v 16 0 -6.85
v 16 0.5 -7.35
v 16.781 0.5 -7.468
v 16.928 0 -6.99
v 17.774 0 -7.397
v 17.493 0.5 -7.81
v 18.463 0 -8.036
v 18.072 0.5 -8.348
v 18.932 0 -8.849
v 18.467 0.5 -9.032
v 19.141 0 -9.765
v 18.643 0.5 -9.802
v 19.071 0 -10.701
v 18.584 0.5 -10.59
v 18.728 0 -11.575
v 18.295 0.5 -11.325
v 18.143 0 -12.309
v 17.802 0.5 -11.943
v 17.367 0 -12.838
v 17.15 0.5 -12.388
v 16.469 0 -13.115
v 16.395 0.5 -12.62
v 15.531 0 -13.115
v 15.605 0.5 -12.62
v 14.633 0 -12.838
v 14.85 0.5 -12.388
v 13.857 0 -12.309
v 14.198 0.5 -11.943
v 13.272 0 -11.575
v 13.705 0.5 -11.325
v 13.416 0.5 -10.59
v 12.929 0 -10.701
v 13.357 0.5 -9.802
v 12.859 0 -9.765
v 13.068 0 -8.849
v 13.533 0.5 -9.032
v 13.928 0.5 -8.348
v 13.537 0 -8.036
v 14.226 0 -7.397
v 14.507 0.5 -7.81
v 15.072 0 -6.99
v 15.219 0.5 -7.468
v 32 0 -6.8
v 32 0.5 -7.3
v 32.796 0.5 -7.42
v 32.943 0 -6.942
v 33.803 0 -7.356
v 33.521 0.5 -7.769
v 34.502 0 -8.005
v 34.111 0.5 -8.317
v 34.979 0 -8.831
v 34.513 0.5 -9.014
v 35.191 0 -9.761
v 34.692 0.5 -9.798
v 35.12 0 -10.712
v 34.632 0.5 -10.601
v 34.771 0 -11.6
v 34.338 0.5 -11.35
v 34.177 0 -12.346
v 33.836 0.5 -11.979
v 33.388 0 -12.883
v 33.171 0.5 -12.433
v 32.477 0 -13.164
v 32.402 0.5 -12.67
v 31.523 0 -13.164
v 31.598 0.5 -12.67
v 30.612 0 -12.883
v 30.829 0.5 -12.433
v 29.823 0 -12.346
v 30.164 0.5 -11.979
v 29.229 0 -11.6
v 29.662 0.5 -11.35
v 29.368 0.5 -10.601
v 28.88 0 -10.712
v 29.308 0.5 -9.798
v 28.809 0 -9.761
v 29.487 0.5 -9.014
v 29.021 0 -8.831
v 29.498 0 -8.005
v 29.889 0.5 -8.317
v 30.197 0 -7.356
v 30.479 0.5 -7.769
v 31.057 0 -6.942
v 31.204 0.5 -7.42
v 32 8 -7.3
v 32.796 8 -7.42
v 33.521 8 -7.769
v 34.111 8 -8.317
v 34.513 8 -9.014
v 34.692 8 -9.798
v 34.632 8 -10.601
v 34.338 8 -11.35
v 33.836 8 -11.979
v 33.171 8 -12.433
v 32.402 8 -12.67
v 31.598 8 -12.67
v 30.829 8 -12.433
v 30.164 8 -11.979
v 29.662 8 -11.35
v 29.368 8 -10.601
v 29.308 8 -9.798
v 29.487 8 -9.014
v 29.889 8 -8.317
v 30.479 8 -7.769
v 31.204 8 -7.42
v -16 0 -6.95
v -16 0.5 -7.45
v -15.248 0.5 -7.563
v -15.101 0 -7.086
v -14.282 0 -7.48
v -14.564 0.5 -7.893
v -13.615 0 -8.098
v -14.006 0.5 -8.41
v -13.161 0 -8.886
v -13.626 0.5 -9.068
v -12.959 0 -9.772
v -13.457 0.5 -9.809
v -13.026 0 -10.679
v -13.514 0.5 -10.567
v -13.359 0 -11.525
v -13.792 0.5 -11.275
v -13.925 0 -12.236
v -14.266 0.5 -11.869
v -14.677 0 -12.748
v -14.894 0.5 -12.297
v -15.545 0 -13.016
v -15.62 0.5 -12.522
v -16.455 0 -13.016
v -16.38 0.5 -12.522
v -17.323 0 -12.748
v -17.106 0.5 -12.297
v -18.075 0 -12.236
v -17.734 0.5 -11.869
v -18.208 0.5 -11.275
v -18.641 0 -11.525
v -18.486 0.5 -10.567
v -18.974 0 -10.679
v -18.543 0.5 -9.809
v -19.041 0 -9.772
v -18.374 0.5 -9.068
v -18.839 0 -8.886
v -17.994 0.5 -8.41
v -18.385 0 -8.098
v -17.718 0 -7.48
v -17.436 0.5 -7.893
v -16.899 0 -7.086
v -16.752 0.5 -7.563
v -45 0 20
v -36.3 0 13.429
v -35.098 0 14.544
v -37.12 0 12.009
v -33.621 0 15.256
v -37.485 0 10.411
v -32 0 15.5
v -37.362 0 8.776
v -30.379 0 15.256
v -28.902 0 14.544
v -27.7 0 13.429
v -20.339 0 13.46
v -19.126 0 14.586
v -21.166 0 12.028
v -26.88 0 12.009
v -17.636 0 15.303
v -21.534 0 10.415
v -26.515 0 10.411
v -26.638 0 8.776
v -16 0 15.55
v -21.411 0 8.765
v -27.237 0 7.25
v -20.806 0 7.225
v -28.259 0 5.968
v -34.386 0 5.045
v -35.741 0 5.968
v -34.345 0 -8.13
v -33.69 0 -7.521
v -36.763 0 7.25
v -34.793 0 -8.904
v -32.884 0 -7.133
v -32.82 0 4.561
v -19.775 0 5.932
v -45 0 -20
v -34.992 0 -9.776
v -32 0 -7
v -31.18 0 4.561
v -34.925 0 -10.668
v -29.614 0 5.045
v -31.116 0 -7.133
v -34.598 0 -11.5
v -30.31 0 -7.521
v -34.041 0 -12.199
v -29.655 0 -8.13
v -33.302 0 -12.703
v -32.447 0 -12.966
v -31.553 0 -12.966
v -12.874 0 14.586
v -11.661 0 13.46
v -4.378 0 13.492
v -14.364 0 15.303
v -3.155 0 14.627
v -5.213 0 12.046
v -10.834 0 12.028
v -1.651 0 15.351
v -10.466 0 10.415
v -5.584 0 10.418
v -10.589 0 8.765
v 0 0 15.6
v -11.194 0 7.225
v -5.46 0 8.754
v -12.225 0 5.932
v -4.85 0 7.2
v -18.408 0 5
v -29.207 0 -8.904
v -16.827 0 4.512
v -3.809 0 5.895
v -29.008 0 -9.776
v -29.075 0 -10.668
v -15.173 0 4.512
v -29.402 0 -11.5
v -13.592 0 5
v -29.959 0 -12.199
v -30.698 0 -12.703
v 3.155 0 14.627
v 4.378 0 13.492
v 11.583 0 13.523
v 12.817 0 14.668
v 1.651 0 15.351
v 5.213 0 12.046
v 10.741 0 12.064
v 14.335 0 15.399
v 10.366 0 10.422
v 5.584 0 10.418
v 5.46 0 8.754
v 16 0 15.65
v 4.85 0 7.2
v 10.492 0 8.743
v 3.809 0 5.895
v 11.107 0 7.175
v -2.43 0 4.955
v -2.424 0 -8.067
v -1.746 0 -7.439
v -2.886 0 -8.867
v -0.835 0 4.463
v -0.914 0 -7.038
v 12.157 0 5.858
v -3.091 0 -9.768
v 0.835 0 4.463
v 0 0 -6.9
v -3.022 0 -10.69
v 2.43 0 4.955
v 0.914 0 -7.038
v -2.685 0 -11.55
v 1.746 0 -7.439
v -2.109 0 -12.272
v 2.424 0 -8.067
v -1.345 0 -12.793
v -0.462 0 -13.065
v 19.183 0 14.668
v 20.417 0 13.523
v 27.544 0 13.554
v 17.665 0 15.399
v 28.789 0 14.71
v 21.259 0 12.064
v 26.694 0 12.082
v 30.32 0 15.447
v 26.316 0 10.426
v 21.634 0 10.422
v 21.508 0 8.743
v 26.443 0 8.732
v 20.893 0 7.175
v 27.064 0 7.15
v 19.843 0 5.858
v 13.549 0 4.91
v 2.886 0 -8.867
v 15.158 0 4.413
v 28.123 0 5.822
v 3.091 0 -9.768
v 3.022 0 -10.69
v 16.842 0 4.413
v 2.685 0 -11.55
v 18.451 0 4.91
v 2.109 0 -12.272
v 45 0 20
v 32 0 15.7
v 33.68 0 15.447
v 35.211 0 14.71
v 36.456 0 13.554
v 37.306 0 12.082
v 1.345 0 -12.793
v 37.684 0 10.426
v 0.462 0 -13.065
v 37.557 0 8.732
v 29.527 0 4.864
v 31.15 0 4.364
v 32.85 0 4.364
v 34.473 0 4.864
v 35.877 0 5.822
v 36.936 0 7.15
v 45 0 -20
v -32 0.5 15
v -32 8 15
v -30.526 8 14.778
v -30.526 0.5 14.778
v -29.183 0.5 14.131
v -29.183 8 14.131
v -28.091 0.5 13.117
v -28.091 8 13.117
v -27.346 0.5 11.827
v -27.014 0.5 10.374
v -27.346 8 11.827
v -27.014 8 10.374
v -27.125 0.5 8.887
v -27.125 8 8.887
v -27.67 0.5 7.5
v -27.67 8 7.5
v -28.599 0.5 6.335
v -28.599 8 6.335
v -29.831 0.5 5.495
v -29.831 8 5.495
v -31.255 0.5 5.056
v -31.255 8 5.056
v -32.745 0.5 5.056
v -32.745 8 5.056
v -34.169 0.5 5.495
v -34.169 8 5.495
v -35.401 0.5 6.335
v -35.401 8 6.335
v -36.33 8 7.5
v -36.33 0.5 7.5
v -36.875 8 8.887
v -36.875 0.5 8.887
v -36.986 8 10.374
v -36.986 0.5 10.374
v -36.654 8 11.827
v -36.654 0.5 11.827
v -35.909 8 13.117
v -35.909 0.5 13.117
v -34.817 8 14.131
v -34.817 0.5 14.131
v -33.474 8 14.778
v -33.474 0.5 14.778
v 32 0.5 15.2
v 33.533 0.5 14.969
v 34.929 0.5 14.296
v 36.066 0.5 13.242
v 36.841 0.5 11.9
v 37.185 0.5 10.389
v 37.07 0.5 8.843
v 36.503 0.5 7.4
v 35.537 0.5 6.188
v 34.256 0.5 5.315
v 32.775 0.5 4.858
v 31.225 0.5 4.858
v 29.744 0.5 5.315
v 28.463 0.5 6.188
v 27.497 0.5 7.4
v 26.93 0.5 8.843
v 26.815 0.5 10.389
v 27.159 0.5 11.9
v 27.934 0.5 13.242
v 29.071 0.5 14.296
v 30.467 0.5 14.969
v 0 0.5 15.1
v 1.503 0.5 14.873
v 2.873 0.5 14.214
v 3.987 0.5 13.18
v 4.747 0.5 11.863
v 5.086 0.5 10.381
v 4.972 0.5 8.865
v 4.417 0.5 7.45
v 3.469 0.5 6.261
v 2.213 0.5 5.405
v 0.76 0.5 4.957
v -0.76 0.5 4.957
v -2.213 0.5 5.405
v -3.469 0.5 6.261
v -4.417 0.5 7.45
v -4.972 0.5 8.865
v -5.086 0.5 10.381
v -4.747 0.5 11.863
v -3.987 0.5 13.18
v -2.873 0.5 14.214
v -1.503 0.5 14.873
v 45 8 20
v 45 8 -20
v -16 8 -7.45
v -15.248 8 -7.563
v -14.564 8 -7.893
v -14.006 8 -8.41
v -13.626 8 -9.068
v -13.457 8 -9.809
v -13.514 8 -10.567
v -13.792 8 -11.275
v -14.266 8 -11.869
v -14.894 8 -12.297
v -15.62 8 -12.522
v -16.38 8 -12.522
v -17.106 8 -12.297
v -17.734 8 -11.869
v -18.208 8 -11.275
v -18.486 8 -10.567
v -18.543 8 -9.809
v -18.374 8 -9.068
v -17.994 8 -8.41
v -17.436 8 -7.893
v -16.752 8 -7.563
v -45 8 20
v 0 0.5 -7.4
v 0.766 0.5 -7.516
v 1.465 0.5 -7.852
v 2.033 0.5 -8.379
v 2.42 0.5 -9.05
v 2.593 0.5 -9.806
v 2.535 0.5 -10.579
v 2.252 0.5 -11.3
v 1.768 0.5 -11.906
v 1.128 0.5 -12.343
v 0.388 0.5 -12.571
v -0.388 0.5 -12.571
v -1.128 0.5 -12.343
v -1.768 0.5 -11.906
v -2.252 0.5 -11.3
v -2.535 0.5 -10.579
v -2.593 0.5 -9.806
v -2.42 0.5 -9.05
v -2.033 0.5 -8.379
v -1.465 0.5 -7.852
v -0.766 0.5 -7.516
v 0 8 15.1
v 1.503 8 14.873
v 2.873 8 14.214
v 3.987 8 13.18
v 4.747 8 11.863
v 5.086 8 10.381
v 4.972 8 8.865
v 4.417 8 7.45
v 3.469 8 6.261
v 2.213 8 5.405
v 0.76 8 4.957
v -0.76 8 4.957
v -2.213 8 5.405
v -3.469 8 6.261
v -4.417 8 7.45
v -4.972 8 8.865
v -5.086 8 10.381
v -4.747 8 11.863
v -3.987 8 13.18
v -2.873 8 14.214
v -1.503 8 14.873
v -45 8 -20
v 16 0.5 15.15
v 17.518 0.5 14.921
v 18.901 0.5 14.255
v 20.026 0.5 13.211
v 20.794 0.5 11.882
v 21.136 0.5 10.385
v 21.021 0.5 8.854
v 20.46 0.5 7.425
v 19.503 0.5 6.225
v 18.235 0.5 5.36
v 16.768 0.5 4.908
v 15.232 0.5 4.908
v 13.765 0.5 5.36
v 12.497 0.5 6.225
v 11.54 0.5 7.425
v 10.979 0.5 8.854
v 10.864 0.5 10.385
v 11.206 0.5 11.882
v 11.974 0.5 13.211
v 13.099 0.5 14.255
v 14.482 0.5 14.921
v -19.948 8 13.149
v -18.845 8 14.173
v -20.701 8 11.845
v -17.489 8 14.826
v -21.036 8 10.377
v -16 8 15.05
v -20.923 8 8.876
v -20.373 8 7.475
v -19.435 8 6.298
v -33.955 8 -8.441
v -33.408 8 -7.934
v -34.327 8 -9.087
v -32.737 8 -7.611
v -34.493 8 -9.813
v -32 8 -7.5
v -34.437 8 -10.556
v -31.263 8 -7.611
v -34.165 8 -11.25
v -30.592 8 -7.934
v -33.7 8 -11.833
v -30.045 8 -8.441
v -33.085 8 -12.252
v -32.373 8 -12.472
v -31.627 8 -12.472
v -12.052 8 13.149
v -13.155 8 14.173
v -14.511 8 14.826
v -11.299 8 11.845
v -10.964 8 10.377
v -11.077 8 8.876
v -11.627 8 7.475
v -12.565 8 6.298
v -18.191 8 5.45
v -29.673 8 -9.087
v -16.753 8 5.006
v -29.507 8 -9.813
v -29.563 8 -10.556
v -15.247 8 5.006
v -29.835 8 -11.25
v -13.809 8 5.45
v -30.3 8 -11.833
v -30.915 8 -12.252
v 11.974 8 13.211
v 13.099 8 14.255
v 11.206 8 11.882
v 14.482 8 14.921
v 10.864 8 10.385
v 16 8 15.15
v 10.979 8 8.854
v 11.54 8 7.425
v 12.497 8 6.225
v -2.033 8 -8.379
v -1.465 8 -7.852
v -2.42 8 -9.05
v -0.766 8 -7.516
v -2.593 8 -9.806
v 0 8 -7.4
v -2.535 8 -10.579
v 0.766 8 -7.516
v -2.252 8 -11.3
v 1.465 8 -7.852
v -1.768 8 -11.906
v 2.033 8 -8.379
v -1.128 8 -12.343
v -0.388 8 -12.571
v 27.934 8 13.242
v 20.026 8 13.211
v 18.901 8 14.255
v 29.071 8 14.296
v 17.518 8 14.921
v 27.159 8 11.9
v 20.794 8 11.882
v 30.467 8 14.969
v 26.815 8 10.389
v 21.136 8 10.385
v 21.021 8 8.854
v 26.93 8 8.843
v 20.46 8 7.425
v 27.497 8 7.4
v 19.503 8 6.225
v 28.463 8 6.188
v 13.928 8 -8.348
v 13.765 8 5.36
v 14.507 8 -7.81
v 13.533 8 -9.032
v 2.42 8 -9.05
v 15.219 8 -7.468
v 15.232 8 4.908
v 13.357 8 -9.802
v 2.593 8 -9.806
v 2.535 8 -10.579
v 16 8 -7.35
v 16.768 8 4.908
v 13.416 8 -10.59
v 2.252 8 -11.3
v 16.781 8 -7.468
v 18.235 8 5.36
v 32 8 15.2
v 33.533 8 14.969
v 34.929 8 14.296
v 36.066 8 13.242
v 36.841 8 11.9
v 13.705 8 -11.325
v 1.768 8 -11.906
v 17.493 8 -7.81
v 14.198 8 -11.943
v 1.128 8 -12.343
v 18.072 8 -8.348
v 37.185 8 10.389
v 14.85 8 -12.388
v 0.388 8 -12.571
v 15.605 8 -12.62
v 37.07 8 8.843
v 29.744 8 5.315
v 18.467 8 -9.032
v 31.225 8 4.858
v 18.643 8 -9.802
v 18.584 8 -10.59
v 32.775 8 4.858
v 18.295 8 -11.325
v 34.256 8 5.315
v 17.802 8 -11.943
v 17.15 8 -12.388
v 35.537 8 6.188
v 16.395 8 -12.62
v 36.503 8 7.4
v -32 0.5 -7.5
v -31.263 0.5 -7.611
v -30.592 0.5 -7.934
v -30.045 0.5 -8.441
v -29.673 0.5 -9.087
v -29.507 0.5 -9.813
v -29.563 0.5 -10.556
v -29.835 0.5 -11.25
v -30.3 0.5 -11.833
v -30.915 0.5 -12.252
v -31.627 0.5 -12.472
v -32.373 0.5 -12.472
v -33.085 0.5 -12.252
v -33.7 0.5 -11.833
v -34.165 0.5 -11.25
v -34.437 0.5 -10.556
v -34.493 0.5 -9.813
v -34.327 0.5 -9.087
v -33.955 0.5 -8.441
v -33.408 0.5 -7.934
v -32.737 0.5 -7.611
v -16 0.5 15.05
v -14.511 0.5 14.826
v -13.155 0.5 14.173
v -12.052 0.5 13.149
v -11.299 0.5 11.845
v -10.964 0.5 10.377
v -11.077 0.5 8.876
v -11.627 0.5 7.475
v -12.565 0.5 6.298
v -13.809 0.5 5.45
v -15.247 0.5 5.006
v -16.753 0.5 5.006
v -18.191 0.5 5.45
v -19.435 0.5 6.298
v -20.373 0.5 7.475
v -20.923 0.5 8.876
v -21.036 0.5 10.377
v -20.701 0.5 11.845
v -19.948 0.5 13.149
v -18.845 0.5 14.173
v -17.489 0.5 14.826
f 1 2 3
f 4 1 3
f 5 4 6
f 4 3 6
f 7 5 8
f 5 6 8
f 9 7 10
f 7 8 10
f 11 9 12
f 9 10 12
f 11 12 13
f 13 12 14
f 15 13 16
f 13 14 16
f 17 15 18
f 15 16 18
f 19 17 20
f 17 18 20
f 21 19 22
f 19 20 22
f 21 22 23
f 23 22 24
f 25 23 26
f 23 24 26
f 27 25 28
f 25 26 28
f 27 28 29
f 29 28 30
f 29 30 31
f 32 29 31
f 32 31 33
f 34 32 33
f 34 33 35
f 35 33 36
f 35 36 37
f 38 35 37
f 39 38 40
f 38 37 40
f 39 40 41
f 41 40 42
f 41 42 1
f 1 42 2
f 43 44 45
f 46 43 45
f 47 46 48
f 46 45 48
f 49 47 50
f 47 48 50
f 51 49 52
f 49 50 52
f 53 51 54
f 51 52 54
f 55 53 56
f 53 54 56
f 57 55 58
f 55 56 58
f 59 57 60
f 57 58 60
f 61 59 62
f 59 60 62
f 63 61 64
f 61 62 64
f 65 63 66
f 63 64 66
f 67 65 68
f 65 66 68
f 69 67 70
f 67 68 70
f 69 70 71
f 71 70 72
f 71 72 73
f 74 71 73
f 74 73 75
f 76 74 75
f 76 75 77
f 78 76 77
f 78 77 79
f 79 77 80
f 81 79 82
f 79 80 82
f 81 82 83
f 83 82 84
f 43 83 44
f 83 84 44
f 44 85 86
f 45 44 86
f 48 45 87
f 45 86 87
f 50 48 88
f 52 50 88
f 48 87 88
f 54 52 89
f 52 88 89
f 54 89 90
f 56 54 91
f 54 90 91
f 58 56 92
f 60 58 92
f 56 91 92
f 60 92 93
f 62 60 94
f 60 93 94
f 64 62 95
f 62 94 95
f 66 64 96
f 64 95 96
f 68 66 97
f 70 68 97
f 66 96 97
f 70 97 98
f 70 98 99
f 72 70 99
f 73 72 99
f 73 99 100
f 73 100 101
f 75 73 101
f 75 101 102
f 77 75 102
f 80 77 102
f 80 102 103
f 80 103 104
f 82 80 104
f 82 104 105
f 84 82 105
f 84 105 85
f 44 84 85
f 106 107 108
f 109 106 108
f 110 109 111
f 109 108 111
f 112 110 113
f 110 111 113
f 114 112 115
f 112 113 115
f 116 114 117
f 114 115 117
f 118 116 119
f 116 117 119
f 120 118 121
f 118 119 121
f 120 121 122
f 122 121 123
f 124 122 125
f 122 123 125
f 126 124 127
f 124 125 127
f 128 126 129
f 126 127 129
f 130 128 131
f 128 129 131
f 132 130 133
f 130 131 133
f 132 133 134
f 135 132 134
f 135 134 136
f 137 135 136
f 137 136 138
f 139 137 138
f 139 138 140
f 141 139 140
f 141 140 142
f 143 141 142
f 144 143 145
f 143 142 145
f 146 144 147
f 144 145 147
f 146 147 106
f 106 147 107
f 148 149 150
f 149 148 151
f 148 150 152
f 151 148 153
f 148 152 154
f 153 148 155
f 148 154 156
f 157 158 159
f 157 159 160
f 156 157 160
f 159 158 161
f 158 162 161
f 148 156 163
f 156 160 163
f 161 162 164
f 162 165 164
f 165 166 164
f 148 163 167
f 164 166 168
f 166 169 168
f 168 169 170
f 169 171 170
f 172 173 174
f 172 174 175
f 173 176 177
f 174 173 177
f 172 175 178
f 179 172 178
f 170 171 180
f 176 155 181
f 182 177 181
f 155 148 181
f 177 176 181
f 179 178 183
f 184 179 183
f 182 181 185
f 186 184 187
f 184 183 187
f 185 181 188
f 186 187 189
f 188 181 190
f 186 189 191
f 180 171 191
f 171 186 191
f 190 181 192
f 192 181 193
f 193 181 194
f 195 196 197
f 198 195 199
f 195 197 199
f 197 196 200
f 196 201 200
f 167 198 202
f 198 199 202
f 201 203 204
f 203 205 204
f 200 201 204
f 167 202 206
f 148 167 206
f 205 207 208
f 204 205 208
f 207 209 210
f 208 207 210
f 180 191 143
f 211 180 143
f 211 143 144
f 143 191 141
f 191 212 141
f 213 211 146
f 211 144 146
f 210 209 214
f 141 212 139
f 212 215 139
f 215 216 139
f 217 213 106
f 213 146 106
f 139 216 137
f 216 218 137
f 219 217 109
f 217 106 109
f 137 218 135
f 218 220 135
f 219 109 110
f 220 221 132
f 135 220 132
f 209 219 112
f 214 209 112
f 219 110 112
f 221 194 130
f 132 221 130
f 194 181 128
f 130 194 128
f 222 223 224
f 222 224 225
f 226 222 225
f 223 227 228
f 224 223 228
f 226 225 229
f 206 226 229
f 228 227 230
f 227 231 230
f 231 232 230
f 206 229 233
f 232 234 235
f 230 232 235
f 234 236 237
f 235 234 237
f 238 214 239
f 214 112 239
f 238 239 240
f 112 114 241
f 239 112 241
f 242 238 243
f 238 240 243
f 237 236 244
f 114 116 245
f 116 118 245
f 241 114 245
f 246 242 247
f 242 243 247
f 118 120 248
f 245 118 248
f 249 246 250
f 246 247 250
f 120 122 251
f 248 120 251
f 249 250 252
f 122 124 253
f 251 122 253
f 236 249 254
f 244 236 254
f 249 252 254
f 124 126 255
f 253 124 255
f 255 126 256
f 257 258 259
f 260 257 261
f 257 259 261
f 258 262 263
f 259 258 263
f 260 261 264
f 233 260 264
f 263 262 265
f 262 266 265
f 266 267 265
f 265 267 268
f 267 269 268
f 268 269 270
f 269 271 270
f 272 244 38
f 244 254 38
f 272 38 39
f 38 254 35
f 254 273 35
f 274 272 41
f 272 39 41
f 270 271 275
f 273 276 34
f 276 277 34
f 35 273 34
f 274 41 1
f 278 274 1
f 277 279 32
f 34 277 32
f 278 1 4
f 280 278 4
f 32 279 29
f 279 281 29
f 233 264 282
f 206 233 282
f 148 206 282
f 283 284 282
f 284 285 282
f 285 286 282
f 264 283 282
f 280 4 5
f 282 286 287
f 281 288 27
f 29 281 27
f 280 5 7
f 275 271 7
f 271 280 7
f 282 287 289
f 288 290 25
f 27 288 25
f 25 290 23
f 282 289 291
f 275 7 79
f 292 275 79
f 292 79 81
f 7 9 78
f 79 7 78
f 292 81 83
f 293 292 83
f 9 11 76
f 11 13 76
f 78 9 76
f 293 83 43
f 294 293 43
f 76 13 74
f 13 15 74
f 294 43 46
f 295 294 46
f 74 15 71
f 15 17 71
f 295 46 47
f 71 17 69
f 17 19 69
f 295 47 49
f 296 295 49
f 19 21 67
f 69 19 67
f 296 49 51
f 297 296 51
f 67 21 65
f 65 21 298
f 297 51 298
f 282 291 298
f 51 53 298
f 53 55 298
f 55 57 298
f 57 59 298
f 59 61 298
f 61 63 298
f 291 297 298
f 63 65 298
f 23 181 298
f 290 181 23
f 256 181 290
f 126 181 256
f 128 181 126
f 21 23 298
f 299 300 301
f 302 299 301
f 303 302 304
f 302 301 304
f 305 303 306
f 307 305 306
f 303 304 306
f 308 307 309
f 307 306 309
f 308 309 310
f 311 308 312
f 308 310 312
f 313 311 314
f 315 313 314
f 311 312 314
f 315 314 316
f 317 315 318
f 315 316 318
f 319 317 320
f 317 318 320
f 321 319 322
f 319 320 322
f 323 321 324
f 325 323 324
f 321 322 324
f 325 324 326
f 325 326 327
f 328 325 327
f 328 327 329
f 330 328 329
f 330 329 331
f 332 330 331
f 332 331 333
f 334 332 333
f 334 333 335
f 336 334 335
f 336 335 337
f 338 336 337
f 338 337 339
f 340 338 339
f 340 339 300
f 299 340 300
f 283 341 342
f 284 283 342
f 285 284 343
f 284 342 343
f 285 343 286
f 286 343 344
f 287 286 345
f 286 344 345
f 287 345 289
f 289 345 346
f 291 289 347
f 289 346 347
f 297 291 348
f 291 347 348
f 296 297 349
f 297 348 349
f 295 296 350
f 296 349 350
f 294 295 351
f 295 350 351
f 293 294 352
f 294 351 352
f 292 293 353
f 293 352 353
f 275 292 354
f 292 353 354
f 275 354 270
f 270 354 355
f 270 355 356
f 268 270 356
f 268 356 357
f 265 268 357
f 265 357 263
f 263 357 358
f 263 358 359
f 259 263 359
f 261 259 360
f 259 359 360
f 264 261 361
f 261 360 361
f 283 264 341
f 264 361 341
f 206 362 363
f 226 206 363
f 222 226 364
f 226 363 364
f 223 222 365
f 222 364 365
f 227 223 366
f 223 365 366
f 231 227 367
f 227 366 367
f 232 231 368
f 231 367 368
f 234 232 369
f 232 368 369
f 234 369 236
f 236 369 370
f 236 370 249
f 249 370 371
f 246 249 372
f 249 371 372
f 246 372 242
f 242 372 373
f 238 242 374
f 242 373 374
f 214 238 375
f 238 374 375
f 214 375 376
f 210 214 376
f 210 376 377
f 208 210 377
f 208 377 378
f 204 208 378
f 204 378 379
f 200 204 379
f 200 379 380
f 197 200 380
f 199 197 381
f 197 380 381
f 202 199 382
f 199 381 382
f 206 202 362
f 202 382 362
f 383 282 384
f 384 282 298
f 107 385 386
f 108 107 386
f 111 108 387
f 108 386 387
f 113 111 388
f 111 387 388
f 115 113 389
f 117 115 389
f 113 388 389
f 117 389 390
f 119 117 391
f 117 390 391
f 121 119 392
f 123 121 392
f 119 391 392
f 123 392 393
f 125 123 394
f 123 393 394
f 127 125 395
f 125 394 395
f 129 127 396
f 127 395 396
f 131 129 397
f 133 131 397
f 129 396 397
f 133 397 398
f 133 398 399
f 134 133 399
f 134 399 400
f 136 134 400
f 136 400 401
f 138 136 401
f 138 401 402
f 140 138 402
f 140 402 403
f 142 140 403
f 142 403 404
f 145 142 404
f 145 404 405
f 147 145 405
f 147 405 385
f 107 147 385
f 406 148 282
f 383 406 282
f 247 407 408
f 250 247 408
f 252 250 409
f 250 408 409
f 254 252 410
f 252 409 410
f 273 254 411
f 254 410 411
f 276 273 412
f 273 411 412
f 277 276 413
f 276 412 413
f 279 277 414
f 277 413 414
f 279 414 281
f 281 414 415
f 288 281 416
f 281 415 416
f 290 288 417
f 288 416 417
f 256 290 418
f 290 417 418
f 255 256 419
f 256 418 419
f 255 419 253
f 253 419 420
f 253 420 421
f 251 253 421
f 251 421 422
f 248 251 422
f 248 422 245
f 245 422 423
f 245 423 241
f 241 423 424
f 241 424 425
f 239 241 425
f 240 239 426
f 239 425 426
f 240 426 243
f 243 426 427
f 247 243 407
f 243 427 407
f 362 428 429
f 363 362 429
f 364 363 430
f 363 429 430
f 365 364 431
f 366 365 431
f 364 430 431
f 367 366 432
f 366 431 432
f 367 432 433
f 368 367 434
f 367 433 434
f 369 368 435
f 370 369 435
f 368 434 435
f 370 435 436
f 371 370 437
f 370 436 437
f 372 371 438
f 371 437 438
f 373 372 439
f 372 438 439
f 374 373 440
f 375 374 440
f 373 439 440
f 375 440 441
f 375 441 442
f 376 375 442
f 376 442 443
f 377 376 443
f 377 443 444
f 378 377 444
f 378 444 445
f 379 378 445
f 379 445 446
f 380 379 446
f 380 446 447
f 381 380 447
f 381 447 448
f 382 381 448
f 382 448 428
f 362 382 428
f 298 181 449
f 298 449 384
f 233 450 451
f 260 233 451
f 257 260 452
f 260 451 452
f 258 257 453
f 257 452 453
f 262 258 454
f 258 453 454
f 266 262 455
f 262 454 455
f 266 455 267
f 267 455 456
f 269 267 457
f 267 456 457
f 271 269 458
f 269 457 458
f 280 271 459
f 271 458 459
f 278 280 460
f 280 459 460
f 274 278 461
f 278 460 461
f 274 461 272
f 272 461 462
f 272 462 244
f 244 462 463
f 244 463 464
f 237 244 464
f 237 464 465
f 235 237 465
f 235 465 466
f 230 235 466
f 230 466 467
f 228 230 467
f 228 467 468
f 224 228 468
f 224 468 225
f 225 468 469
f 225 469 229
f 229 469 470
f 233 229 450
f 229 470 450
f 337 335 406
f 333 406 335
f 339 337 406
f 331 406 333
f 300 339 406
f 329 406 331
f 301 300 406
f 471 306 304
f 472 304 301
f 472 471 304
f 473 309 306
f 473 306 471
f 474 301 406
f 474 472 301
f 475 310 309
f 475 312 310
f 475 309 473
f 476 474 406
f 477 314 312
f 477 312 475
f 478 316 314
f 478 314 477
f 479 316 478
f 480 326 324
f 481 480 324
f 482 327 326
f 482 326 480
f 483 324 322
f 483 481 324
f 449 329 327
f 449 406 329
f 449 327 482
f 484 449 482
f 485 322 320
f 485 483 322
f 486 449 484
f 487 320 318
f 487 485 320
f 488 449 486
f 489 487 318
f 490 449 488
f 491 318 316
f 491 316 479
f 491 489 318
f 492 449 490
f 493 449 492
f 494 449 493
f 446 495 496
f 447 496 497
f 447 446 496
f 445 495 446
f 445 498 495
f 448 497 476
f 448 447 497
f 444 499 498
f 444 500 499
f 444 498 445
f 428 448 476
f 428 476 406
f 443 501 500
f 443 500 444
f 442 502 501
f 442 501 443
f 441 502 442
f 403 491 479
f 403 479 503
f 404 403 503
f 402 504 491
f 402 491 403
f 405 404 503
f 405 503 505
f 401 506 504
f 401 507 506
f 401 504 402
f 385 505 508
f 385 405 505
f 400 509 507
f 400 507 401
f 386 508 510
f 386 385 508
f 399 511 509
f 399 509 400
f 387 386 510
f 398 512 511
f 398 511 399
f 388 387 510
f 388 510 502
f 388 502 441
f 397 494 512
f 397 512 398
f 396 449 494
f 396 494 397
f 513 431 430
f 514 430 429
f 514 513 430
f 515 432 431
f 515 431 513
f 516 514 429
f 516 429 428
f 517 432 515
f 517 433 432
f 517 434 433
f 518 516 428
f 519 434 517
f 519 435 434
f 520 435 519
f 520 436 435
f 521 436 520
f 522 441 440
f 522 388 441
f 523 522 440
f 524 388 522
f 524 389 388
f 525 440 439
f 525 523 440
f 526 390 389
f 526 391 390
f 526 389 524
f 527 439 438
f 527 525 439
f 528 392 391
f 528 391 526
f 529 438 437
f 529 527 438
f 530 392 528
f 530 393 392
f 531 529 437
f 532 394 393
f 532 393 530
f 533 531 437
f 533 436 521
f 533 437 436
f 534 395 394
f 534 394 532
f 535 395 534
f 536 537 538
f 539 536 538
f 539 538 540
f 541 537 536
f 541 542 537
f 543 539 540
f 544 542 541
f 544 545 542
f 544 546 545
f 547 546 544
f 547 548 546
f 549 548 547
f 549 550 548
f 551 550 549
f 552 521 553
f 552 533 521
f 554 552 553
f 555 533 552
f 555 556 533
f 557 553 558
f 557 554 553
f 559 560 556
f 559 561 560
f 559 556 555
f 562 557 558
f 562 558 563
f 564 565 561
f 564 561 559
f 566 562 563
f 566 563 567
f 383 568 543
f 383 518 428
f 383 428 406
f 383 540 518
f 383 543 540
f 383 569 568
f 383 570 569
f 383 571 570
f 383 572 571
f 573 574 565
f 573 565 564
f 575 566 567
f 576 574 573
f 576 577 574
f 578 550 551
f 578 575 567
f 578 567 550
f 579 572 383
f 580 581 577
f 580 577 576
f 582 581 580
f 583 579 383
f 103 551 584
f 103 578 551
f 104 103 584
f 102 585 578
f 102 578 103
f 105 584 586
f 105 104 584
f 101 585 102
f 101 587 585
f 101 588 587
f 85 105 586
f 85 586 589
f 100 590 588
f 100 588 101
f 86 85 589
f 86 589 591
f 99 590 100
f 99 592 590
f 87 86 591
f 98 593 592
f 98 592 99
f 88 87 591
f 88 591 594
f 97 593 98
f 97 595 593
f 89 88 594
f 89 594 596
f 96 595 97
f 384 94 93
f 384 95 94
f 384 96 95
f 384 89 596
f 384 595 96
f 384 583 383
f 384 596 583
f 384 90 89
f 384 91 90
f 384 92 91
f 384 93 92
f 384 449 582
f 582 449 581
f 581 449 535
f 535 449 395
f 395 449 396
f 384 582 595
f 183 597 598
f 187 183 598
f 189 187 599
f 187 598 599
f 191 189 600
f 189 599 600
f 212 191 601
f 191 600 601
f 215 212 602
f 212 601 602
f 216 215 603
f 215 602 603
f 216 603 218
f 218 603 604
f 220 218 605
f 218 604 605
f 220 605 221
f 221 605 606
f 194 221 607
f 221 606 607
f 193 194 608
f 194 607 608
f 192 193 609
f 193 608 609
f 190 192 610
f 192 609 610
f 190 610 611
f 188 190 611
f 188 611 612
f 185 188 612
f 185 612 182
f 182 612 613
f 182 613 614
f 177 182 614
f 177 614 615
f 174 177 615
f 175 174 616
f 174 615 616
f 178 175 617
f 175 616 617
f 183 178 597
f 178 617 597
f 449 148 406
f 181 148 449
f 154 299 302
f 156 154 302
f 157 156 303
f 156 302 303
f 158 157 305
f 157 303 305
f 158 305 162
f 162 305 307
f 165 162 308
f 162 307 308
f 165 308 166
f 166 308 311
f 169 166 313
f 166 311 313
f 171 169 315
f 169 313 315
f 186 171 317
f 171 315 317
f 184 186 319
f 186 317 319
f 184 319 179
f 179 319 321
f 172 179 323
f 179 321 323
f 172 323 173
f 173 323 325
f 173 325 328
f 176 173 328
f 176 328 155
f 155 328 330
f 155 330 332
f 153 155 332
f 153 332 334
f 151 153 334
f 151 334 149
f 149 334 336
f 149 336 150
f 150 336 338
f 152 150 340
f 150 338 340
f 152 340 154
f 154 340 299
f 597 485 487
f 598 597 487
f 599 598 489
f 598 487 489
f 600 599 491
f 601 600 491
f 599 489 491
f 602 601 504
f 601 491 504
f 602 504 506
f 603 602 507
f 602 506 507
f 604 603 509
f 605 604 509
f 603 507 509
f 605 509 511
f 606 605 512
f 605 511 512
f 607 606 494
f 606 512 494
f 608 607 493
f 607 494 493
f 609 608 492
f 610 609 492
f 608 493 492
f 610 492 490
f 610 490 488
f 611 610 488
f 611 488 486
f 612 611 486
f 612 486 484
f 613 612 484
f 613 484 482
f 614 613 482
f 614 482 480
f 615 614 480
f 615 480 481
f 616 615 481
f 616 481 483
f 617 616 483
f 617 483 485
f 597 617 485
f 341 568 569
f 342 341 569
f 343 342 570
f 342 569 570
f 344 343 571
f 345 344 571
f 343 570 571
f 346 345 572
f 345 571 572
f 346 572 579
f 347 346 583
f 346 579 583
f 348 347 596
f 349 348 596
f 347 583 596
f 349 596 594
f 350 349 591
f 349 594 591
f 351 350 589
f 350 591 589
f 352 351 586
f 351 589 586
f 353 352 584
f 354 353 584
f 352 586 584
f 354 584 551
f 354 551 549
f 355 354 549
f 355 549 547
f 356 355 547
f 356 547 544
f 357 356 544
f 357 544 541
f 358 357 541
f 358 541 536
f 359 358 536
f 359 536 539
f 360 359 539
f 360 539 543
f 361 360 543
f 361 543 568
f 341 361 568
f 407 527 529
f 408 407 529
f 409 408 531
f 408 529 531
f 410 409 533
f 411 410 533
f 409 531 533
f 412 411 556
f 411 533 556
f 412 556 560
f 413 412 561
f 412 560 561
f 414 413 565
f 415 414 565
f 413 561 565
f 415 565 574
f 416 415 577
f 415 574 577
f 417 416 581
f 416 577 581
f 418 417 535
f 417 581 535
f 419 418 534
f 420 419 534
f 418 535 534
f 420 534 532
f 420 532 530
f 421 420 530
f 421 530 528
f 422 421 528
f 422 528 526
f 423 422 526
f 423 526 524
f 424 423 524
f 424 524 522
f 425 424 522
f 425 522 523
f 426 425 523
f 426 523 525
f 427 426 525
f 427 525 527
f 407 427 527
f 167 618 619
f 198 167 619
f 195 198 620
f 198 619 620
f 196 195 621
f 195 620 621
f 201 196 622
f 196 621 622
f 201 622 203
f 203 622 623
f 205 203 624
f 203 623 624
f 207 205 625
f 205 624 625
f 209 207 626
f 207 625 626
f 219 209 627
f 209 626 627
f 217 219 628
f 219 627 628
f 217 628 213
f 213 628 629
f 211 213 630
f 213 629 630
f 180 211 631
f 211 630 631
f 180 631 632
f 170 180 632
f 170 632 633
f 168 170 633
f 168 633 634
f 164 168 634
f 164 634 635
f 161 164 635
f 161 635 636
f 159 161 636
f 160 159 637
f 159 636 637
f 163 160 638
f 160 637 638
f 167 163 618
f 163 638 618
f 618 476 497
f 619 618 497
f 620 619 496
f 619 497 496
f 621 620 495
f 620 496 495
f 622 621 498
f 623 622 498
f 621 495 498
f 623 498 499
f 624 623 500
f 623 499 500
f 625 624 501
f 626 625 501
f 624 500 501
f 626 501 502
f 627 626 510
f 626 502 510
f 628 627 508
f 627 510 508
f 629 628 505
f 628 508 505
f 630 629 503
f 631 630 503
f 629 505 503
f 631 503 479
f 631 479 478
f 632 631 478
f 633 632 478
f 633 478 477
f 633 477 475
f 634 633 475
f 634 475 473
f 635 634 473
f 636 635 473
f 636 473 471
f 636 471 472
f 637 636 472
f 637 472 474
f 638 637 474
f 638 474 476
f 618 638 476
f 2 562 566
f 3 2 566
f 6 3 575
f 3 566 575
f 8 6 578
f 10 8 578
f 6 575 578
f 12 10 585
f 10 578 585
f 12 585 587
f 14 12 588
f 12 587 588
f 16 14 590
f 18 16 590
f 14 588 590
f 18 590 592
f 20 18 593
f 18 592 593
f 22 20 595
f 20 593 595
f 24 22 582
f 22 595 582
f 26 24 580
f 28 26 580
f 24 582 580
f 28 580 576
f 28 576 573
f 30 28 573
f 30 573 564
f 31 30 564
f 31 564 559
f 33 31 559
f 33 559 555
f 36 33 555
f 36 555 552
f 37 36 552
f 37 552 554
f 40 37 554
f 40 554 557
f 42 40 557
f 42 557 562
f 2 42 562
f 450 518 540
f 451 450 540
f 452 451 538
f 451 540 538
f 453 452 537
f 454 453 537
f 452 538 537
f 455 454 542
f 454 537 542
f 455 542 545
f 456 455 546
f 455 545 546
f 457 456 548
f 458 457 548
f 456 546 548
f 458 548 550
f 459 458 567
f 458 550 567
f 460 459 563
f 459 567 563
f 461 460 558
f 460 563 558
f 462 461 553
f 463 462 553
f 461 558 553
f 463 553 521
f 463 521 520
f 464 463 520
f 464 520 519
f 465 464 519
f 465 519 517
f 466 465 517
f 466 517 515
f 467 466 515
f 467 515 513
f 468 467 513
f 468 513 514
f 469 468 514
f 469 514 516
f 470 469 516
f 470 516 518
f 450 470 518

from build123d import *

# Parameters (mm, degrees)
SKETCH1_W         = 90
SKETCH1_H         = 40
PLATE_DEPTH       = 8
SKETCH2_R         = 2.5
SKETCH2_R_2       = 2.55
SKETCH2_R_3       = 2.6
SKETCH2_R_4       = 2.65
SKETCH2_R_5       = 2.7
SKETCH2_R_6       = 5
SKETCH2_R_7       = 5.05
SKETCH2_R_8       = 5.1
SKETCH2_R_9       = 5.15
SKETCH2_R_10      = 5.2
TEST_HOLES_DEPTH  = 50.889878733
BED_CHAMFERS_SIZE = 0.5


with BuildPart() as part:
    # Sketch1 → Plate (new body)
    with BuildSketch(Plane(origin=(0, 0, 0), x_dir=(1, 0, 0), z_dir=(0, 1, 0))):
        Rectangle(SKETCH1_W, SKETCH1_H)
    extrude(amount=PLATE_DEPTH)

    # Sketch2 → Test holes (cut, through all)
    with BuildSketch(Plane(origin=(0, 8, 0), x_dir=(1, 0, 0), z_dir=(0, 1, 0))):
        with Locations(Location((-32, 10, 0), (0, 0, 270))):
            Circle(SKETCH2_R)
        with Locations(Location((-16, 10, 0), (0, 0, 270))):
            Circle(SKETCH2_R_2)
        with Locations(Location((0, 10, 0), (0, 0, 270))):
            Circle(SKETCH2_R_3)
        with Locations(Location((16, 10, 0), (0, 0, 270))):
            Circle(SKETCH2_R_4)
        with Locations(Location((32, 10, 0), (0, 0, 270))):
            Circle(SKETCH2_R_5)
        with Locations(Location((-32, -10, 0), (0, 0, 270))):
            Circle(SKETCH2_R_6)
        with Locations(Location((-16, -10, 0), (0, 0, 270))):
            Circle(SKETCH2_R_7)
        with Locations(Location((0, -10, 0), (0, 0, 270))):
            Circle(SKETCH2_R_8)
        with Locations(Location((16, -10, 0), (0, 0, 270))):
            Circle(SKETCH2_R_9)
        with Locations(Location((32, -10, 0), (0, 0, 270))):
            Circle(SKETCH2_R_10)
    extrude(amount=-TEST_HOLES_DEPTH, mode=Mode.SUBTRACT)

    # Bed chamfers
    bed_chamfers_edges = [part.edges().sort_by_distance(p)[0] for p in [
        (-16, 0, -12.55),
        (0, 0, -12.6),
        (16, 0, -12.65),
        (32, 0, -12.7),
        (-32, 0, 5),
        (-16, 0, 4.95),
        (0, 0, 4.9),
        (16, 0, 4.85),
        (32, 0, 4.8),
        (-32, 0, -12.5),
    ]]
    chamfer(bed_chamfers_edges, length=BED_CHAMFERS_SIZE)


solid = part.part
